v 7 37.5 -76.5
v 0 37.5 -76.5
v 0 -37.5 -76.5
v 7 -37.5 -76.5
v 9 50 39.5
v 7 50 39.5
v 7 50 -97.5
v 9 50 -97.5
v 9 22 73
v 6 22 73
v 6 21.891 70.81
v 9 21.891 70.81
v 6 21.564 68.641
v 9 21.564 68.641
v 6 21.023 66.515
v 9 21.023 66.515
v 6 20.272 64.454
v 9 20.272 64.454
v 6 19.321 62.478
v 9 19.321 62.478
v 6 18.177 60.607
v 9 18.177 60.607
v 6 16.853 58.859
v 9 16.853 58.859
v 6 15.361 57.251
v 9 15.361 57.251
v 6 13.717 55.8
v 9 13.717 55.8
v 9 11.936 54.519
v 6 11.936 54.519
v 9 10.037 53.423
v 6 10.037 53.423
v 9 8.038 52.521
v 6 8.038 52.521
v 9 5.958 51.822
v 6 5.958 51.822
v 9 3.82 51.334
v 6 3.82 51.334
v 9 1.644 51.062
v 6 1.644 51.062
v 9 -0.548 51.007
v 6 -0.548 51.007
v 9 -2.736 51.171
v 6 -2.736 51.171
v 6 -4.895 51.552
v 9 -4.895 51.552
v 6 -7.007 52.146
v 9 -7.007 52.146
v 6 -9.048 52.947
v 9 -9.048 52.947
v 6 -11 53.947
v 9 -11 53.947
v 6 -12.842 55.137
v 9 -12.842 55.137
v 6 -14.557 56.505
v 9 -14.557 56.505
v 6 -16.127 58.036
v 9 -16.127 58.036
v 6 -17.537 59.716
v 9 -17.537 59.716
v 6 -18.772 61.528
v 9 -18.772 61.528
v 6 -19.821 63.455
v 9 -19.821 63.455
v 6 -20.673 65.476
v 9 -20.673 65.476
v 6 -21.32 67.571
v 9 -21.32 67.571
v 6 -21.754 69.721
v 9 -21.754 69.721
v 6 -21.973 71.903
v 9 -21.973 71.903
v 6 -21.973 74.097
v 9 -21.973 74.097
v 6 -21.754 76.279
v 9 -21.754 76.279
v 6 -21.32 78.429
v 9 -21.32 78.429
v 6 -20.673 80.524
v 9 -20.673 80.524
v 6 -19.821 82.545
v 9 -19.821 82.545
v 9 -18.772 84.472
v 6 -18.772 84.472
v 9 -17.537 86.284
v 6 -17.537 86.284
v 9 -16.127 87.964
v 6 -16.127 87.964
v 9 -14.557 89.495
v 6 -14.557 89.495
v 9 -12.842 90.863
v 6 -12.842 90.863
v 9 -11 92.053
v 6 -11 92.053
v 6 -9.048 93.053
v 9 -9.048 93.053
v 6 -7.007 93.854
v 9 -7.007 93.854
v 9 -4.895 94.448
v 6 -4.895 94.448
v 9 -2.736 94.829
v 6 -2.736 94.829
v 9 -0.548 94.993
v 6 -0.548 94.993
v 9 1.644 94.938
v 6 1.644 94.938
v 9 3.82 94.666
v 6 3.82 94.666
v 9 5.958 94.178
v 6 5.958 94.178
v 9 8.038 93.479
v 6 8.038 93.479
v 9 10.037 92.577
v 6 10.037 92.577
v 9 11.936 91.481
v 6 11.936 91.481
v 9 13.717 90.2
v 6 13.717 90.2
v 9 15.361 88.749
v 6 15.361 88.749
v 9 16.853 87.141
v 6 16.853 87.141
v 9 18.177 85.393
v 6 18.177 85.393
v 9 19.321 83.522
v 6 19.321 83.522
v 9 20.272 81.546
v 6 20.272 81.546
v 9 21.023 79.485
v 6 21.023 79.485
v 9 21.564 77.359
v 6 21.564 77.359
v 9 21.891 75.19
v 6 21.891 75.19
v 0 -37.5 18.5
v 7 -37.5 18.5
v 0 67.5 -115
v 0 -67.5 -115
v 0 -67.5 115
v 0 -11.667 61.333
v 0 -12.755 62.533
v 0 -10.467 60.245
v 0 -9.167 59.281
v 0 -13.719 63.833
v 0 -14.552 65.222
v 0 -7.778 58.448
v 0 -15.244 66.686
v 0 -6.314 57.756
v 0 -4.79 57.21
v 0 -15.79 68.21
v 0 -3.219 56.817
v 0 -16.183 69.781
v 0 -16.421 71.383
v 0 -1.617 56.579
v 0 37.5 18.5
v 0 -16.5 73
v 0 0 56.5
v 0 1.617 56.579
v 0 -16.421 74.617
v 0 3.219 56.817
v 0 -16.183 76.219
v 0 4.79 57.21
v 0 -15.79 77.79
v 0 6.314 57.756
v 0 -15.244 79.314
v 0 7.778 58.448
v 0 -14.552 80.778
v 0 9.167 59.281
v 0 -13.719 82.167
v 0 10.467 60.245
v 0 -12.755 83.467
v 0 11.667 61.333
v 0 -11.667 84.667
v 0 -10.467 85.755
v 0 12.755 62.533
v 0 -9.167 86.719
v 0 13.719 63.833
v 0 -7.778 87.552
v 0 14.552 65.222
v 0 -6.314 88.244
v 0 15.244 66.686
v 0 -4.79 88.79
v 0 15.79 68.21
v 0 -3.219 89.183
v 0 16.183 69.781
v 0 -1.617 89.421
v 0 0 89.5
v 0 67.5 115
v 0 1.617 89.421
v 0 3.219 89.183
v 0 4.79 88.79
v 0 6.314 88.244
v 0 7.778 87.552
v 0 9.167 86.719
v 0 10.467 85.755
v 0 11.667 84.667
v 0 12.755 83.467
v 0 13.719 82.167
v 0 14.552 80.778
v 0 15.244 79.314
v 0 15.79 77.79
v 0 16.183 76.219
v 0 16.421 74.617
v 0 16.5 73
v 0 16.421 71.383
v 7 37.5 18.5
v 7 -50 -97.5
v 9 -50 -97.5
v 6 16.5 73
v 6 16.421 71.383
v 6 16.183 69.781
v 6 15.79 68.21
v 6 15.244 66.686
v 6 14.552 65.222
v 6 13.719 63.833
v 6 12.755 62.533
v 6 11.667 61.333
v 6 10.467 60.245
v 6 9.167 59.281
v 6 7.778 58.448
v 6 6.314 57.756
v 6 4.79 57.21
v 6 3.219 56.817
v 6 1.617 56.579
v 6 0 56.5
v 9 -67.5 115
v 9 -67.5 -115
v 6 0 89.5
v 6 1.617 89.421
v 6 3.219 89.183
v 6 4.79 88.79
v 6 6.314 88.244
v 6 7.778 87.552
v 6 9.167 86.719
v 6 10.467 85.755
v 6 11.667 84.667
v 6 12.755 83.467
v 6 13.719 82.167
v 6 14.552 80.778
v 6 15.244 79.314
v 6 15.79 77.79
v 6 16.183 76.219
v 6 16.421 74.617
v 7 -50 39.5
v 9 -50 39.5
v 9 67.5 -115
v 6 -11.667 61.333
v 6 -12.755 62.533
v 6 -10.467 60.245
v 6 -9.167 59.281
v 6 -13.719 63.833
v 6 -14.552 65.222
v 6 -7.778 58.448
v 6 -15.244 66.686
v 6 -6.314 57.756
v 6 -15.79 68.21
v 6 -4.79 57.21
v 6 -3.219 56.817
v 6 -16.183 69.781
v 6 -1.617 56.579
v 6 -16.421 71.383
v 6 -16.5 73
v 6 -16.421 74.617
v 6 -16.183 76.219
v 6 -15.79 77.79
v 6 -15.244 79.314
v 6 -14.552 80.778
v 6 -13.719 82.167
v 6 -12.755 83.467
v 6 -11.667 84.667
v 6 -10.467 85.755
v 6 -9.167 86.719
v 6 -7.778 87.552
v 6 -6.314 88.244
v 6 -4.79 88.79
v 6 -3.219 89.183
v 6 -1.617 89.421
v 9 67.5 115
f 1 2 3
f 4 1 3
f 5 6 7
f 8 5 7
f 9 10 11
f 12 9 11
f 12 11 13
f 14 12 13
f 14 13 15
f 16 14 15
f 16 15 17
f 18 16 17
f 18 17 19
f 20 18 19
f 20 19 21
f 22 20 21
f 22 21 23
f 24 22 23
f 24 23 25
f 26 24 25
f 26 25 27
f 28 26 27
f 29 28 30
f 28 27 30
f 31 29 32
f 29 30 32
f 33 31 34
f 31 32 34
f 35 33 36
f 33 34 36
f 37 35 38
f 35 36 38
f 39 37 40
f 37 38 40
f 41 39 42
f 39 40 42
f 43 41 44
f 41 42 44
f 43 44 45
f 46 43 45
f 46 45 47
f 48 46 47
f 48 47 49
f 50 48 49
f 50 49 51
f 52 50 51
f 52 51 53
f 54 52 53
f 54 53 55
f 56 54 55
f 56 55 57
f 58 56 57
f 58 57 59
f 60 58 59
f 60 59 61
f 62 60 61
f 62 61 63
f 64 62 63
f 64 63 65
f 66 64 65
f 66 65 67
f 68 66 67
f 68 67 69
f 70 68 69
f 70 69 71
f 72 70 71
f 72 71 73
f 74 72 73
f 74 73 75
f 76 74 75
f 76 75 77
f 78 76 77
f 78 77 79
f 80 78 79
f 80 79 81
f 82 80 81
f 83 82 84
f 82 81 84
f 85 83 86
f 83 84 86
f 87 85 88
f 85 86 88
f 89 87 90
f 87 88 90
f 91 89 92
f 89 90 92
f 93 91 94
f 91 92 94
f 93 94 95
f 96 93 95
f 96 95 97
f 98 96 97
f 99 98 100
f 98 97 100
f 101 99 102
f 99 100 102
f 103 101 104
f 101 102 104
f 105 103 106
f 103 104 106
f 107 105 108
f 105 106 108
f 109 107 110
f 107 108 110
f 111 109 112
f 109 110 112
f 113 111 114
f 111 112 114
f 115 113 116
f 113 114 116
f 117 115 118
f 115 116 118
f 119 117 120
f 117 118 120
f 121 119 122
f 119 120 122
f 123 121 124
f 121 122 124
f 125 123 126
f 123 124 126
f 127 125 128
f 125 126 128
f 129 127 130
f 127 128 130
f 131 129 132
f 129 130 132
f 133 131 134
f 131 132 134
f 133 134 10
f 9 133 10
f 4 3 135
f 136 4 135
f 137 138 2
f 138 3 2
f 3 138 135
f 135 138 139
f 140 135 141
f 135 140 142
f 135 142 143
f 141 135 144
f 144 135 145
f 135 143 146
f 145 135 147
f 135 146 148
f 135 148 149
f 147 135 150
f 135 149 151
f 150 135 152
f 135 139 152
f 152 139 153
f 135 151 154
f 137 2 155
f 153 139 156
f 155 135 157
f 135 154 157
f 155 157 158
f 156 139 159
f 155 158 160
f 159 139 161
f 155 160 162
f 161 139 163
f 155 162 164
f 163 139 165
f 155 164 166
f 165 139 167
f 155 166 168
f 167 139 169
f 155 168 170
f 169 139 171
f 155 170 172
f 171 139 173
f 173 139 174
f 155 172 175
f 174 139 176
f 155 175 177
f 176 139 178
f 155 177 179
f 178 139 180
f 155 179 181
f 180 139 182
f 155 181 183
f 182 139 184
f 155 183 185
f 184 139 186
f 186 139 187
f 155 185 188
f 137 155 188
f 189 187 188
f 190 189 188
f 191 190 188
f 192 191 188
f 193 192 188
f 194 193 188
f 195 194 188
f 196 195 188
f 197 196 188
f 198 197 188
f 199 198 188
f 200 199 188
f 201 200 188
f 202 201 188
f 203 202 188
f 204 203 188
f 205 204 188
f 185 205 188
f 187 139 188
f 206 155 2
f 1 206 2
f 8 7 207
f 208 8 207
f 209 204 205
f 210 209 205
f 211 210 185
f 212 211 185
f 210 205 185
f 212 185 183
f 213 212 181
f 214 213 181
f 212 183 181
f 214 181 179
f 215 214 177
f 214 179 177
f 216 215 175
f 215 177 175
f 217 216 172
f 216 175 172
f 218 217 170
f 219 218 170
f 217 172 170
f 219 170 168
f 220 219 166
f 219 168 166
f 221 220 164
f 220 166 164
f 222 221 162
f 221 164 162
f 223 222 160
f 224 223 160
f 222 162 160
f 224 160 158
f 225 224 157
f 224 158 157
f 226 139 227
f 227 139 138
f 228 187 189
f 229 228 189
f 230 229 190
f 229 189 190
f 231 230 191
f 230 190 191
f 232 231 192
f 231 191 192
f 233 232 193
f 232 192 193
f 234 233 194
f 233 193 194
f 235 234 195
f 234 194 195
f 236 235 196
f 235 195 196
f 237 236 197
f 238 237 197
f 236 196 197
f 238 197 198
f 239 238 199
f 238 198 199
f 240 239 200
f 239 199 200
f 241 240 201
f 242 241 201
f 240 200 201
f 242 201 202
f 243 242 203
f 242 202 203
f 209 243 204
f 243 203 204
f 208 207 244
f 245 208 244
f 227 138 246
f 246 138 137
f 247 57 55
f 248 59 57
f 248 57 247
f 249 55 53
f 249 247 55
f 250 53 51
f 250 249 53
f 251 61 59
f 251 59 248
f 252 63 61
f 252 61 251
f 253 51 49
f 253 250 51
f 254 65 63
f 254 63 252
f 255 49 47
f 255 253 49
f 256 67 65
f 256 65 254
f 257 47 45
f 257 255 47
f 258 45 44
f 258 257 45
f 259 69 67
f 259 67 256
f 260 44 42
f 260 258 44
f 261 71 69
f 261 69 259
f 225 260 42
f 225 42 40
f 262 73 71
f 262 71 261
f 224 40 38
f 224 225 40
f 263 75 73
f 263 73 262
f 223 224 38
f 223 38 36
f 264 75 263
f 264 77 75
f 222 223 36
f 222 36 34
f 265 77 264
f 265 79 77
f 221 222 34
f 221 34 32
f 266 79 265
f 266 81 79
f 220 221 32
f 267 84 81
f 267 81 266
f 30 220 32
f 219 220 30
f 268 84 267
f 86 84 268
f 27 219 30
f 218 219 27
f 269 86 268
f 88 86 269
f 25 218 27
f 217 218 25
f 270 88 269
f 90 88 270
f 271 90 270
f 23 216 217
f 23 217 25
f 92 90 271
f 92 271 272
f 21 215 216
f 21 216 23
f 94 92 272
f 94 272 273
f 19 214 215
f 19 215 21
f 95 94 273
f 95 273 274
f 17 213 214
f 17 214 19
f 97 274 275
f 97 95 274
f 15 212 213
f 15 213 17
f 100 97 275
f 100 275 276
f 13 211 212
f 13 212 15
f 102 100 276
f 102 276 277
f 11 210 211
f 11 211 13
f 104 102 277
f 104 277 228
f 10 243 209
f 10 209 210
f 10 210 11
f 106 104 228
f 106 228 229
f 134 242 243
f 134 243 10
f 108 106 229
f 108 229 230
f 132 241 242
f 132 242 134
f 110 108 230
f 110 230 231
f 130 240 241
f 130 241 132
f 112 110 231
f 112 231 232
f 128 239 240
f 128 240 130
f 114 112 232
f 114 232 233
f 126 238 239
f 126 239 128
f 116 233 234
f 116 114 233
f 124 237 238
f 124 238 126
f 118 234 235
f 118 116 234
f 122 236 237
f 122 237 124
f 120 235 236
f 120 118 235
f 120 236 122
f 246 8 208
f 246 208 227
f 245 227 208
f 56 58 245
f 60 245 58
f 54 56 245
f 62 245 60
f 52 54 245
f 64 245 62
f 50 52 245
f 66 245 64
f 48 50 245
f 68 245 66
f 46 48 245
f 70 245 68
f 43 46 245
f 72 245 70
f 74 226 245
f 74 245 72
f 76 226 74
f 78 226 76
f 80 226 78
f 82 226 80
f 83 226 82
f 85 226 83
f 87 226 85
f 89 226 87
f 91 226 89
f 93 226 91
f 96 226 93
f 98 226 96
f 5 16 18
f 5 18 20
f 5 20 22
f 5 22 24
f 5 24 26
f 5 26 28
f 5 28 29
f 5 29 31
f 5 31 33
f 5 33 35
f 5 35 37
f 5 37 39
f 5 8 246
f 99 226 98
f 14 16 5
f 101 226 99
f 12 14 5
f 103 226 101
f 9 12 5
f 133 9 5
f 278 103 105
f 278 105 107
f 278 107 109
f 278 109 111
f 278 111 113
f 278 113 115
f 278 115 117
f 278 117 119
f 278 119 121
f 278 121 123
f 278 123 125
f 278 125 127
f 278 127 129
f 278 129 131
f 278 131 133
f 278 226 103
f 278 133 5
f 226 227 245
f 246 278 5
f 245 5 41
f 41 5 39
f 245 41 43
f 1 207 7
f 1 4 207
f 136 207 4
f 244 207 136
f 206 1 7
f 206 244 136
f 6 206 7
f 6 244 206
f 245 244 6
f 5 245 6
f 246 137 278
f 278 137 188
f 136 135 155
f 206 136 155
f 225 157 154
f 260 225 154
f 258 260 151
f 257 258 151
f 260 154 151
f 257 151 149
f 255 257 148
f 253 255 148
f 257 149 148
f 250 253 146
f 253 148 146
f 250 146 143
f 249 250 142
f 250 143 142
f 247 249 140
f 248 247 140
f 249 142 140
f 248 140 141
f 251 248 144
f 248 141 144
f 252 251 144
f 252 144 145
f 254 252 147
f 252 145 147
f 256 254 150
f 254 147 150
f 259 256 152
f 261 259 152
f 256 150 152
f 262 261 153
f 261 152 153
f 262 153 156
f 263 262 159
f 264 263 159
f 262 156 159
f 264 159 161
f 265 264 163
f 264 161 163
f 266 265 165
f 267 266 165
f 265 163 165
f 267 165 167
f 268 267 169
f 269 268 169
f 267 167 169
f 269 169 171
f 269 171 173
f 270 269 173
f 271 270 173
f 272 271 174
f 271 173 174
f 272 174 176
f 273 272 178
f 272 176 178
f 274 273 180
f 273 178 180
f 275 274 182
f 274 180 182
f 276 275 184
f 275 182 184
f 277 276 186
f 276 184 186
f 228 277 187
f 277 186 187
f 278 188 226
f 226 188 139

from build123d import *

# Parameters (mm, degrees)
F1_DEPTH = 9
F2_DEPTH = 6
F3_DEPTH = 7


with BuildPart() as f1:
    # F0 (on Right) → F1 (new body)
    with BuildSketch(Plane.YZ):
        with BuildLine():
            Line((0, 115), (-67.5, 115))
            Line((-67.5, 115), (-67.5, -115))
            Line((-67.5, -115), (0, -115))
            Line((0, -115), (0, -97.5))
            Line((0, -97.5), (-50, -97.5))
            Line((-50, -97.5), (-50, 30.4482906163))
            Line((-50, 30.4482906163), (-50, 39.5))
            Line((-50, 39.5), (0, 39.5))
            Line((0, 39.5), (0, 51))
            ThreePointArc((0, 51), (-22, 73), (0, 95))
            Line((0, 95), (0, 115))
        make_face()
        with BuildLine():
            Line((67.5, 115), (0, 115))
            Line((0, 115), (0, 95))
            ThreePointArc((0, 95), (15.5563491861, 88.5563491861), (22, 73))
            ThreePointArc((22, 73), (15.5563491861, 57.4436508139), (0, 51))
            Line((0, 51), (0, 39.5))
            Line((0, 39.5), (50, 39.5))
            Line((50, 39.5), (50, 30.4482906163))
            Line((50, 30.4482906163), (50, -97.5))
            Line((50, -97.5), (0, -97.5))
            Line((0, -97.5), (0, -115))
            Line((0, -115), (67.5, -115))
            Line((67.5, -115), (67.5, 115))
        make_face()
    extrude(amount=F1_DEPTH)

    # F0 (on Right) → F2 (join)
    with BuildSketch(Plane.YZ):
        with BuildLine():
            Line((0, 89.5), (0, 95))
            ThreePointArc((0, 95), (-22, 73), (0, 51))
            Line((0, 51), (0, 56.5))
            ThreePointArc((0, 56.5), (-16.5, 73), (0, 89.5))
        make_face()
        with BuildLine():
            ThreePointArc((22, 73), (15.5563491861, 88.5563491861), (0, 95))
            Line((0, 95), (0, 89.5))
            ThreePointArc((0, 89.5), (11.6672618896, 84.6672618896), (16.5, 73))
            ThreePointArc((16.5, 73), (11.6672618896, 61.3327381104), (0, 56.5))
            Line((0, 56.5), (0, 51))
            ThreePointArc((0, 51), (15.5563491861, 57.4436508139), (22, 73))
        make_face()
    extrude(amount=F2_DEPTH)

    # F0 (on Right) → F3 (join)
    with BuildSketch(Plane.YZ):
        Polygon((-50, -97.5), (0, -97.5), (0, -76.5), (-37.5, -76.5), (-37.5, 18.5), (0, 18.5), (0, 39.5), (-50, 39.5), (-50, 30.4482906163), align=None)
        Polygon((0, -76.5), (0, -97.5), (50, -97.5), (50, 30.4482906163), (50, 39.5), (0, 39.5), (0, 18.5), (37.5, 18.5), (37.5, -76.5), align=None)
    extrude(amount=F3_DEPTH)


solid = f1.part
